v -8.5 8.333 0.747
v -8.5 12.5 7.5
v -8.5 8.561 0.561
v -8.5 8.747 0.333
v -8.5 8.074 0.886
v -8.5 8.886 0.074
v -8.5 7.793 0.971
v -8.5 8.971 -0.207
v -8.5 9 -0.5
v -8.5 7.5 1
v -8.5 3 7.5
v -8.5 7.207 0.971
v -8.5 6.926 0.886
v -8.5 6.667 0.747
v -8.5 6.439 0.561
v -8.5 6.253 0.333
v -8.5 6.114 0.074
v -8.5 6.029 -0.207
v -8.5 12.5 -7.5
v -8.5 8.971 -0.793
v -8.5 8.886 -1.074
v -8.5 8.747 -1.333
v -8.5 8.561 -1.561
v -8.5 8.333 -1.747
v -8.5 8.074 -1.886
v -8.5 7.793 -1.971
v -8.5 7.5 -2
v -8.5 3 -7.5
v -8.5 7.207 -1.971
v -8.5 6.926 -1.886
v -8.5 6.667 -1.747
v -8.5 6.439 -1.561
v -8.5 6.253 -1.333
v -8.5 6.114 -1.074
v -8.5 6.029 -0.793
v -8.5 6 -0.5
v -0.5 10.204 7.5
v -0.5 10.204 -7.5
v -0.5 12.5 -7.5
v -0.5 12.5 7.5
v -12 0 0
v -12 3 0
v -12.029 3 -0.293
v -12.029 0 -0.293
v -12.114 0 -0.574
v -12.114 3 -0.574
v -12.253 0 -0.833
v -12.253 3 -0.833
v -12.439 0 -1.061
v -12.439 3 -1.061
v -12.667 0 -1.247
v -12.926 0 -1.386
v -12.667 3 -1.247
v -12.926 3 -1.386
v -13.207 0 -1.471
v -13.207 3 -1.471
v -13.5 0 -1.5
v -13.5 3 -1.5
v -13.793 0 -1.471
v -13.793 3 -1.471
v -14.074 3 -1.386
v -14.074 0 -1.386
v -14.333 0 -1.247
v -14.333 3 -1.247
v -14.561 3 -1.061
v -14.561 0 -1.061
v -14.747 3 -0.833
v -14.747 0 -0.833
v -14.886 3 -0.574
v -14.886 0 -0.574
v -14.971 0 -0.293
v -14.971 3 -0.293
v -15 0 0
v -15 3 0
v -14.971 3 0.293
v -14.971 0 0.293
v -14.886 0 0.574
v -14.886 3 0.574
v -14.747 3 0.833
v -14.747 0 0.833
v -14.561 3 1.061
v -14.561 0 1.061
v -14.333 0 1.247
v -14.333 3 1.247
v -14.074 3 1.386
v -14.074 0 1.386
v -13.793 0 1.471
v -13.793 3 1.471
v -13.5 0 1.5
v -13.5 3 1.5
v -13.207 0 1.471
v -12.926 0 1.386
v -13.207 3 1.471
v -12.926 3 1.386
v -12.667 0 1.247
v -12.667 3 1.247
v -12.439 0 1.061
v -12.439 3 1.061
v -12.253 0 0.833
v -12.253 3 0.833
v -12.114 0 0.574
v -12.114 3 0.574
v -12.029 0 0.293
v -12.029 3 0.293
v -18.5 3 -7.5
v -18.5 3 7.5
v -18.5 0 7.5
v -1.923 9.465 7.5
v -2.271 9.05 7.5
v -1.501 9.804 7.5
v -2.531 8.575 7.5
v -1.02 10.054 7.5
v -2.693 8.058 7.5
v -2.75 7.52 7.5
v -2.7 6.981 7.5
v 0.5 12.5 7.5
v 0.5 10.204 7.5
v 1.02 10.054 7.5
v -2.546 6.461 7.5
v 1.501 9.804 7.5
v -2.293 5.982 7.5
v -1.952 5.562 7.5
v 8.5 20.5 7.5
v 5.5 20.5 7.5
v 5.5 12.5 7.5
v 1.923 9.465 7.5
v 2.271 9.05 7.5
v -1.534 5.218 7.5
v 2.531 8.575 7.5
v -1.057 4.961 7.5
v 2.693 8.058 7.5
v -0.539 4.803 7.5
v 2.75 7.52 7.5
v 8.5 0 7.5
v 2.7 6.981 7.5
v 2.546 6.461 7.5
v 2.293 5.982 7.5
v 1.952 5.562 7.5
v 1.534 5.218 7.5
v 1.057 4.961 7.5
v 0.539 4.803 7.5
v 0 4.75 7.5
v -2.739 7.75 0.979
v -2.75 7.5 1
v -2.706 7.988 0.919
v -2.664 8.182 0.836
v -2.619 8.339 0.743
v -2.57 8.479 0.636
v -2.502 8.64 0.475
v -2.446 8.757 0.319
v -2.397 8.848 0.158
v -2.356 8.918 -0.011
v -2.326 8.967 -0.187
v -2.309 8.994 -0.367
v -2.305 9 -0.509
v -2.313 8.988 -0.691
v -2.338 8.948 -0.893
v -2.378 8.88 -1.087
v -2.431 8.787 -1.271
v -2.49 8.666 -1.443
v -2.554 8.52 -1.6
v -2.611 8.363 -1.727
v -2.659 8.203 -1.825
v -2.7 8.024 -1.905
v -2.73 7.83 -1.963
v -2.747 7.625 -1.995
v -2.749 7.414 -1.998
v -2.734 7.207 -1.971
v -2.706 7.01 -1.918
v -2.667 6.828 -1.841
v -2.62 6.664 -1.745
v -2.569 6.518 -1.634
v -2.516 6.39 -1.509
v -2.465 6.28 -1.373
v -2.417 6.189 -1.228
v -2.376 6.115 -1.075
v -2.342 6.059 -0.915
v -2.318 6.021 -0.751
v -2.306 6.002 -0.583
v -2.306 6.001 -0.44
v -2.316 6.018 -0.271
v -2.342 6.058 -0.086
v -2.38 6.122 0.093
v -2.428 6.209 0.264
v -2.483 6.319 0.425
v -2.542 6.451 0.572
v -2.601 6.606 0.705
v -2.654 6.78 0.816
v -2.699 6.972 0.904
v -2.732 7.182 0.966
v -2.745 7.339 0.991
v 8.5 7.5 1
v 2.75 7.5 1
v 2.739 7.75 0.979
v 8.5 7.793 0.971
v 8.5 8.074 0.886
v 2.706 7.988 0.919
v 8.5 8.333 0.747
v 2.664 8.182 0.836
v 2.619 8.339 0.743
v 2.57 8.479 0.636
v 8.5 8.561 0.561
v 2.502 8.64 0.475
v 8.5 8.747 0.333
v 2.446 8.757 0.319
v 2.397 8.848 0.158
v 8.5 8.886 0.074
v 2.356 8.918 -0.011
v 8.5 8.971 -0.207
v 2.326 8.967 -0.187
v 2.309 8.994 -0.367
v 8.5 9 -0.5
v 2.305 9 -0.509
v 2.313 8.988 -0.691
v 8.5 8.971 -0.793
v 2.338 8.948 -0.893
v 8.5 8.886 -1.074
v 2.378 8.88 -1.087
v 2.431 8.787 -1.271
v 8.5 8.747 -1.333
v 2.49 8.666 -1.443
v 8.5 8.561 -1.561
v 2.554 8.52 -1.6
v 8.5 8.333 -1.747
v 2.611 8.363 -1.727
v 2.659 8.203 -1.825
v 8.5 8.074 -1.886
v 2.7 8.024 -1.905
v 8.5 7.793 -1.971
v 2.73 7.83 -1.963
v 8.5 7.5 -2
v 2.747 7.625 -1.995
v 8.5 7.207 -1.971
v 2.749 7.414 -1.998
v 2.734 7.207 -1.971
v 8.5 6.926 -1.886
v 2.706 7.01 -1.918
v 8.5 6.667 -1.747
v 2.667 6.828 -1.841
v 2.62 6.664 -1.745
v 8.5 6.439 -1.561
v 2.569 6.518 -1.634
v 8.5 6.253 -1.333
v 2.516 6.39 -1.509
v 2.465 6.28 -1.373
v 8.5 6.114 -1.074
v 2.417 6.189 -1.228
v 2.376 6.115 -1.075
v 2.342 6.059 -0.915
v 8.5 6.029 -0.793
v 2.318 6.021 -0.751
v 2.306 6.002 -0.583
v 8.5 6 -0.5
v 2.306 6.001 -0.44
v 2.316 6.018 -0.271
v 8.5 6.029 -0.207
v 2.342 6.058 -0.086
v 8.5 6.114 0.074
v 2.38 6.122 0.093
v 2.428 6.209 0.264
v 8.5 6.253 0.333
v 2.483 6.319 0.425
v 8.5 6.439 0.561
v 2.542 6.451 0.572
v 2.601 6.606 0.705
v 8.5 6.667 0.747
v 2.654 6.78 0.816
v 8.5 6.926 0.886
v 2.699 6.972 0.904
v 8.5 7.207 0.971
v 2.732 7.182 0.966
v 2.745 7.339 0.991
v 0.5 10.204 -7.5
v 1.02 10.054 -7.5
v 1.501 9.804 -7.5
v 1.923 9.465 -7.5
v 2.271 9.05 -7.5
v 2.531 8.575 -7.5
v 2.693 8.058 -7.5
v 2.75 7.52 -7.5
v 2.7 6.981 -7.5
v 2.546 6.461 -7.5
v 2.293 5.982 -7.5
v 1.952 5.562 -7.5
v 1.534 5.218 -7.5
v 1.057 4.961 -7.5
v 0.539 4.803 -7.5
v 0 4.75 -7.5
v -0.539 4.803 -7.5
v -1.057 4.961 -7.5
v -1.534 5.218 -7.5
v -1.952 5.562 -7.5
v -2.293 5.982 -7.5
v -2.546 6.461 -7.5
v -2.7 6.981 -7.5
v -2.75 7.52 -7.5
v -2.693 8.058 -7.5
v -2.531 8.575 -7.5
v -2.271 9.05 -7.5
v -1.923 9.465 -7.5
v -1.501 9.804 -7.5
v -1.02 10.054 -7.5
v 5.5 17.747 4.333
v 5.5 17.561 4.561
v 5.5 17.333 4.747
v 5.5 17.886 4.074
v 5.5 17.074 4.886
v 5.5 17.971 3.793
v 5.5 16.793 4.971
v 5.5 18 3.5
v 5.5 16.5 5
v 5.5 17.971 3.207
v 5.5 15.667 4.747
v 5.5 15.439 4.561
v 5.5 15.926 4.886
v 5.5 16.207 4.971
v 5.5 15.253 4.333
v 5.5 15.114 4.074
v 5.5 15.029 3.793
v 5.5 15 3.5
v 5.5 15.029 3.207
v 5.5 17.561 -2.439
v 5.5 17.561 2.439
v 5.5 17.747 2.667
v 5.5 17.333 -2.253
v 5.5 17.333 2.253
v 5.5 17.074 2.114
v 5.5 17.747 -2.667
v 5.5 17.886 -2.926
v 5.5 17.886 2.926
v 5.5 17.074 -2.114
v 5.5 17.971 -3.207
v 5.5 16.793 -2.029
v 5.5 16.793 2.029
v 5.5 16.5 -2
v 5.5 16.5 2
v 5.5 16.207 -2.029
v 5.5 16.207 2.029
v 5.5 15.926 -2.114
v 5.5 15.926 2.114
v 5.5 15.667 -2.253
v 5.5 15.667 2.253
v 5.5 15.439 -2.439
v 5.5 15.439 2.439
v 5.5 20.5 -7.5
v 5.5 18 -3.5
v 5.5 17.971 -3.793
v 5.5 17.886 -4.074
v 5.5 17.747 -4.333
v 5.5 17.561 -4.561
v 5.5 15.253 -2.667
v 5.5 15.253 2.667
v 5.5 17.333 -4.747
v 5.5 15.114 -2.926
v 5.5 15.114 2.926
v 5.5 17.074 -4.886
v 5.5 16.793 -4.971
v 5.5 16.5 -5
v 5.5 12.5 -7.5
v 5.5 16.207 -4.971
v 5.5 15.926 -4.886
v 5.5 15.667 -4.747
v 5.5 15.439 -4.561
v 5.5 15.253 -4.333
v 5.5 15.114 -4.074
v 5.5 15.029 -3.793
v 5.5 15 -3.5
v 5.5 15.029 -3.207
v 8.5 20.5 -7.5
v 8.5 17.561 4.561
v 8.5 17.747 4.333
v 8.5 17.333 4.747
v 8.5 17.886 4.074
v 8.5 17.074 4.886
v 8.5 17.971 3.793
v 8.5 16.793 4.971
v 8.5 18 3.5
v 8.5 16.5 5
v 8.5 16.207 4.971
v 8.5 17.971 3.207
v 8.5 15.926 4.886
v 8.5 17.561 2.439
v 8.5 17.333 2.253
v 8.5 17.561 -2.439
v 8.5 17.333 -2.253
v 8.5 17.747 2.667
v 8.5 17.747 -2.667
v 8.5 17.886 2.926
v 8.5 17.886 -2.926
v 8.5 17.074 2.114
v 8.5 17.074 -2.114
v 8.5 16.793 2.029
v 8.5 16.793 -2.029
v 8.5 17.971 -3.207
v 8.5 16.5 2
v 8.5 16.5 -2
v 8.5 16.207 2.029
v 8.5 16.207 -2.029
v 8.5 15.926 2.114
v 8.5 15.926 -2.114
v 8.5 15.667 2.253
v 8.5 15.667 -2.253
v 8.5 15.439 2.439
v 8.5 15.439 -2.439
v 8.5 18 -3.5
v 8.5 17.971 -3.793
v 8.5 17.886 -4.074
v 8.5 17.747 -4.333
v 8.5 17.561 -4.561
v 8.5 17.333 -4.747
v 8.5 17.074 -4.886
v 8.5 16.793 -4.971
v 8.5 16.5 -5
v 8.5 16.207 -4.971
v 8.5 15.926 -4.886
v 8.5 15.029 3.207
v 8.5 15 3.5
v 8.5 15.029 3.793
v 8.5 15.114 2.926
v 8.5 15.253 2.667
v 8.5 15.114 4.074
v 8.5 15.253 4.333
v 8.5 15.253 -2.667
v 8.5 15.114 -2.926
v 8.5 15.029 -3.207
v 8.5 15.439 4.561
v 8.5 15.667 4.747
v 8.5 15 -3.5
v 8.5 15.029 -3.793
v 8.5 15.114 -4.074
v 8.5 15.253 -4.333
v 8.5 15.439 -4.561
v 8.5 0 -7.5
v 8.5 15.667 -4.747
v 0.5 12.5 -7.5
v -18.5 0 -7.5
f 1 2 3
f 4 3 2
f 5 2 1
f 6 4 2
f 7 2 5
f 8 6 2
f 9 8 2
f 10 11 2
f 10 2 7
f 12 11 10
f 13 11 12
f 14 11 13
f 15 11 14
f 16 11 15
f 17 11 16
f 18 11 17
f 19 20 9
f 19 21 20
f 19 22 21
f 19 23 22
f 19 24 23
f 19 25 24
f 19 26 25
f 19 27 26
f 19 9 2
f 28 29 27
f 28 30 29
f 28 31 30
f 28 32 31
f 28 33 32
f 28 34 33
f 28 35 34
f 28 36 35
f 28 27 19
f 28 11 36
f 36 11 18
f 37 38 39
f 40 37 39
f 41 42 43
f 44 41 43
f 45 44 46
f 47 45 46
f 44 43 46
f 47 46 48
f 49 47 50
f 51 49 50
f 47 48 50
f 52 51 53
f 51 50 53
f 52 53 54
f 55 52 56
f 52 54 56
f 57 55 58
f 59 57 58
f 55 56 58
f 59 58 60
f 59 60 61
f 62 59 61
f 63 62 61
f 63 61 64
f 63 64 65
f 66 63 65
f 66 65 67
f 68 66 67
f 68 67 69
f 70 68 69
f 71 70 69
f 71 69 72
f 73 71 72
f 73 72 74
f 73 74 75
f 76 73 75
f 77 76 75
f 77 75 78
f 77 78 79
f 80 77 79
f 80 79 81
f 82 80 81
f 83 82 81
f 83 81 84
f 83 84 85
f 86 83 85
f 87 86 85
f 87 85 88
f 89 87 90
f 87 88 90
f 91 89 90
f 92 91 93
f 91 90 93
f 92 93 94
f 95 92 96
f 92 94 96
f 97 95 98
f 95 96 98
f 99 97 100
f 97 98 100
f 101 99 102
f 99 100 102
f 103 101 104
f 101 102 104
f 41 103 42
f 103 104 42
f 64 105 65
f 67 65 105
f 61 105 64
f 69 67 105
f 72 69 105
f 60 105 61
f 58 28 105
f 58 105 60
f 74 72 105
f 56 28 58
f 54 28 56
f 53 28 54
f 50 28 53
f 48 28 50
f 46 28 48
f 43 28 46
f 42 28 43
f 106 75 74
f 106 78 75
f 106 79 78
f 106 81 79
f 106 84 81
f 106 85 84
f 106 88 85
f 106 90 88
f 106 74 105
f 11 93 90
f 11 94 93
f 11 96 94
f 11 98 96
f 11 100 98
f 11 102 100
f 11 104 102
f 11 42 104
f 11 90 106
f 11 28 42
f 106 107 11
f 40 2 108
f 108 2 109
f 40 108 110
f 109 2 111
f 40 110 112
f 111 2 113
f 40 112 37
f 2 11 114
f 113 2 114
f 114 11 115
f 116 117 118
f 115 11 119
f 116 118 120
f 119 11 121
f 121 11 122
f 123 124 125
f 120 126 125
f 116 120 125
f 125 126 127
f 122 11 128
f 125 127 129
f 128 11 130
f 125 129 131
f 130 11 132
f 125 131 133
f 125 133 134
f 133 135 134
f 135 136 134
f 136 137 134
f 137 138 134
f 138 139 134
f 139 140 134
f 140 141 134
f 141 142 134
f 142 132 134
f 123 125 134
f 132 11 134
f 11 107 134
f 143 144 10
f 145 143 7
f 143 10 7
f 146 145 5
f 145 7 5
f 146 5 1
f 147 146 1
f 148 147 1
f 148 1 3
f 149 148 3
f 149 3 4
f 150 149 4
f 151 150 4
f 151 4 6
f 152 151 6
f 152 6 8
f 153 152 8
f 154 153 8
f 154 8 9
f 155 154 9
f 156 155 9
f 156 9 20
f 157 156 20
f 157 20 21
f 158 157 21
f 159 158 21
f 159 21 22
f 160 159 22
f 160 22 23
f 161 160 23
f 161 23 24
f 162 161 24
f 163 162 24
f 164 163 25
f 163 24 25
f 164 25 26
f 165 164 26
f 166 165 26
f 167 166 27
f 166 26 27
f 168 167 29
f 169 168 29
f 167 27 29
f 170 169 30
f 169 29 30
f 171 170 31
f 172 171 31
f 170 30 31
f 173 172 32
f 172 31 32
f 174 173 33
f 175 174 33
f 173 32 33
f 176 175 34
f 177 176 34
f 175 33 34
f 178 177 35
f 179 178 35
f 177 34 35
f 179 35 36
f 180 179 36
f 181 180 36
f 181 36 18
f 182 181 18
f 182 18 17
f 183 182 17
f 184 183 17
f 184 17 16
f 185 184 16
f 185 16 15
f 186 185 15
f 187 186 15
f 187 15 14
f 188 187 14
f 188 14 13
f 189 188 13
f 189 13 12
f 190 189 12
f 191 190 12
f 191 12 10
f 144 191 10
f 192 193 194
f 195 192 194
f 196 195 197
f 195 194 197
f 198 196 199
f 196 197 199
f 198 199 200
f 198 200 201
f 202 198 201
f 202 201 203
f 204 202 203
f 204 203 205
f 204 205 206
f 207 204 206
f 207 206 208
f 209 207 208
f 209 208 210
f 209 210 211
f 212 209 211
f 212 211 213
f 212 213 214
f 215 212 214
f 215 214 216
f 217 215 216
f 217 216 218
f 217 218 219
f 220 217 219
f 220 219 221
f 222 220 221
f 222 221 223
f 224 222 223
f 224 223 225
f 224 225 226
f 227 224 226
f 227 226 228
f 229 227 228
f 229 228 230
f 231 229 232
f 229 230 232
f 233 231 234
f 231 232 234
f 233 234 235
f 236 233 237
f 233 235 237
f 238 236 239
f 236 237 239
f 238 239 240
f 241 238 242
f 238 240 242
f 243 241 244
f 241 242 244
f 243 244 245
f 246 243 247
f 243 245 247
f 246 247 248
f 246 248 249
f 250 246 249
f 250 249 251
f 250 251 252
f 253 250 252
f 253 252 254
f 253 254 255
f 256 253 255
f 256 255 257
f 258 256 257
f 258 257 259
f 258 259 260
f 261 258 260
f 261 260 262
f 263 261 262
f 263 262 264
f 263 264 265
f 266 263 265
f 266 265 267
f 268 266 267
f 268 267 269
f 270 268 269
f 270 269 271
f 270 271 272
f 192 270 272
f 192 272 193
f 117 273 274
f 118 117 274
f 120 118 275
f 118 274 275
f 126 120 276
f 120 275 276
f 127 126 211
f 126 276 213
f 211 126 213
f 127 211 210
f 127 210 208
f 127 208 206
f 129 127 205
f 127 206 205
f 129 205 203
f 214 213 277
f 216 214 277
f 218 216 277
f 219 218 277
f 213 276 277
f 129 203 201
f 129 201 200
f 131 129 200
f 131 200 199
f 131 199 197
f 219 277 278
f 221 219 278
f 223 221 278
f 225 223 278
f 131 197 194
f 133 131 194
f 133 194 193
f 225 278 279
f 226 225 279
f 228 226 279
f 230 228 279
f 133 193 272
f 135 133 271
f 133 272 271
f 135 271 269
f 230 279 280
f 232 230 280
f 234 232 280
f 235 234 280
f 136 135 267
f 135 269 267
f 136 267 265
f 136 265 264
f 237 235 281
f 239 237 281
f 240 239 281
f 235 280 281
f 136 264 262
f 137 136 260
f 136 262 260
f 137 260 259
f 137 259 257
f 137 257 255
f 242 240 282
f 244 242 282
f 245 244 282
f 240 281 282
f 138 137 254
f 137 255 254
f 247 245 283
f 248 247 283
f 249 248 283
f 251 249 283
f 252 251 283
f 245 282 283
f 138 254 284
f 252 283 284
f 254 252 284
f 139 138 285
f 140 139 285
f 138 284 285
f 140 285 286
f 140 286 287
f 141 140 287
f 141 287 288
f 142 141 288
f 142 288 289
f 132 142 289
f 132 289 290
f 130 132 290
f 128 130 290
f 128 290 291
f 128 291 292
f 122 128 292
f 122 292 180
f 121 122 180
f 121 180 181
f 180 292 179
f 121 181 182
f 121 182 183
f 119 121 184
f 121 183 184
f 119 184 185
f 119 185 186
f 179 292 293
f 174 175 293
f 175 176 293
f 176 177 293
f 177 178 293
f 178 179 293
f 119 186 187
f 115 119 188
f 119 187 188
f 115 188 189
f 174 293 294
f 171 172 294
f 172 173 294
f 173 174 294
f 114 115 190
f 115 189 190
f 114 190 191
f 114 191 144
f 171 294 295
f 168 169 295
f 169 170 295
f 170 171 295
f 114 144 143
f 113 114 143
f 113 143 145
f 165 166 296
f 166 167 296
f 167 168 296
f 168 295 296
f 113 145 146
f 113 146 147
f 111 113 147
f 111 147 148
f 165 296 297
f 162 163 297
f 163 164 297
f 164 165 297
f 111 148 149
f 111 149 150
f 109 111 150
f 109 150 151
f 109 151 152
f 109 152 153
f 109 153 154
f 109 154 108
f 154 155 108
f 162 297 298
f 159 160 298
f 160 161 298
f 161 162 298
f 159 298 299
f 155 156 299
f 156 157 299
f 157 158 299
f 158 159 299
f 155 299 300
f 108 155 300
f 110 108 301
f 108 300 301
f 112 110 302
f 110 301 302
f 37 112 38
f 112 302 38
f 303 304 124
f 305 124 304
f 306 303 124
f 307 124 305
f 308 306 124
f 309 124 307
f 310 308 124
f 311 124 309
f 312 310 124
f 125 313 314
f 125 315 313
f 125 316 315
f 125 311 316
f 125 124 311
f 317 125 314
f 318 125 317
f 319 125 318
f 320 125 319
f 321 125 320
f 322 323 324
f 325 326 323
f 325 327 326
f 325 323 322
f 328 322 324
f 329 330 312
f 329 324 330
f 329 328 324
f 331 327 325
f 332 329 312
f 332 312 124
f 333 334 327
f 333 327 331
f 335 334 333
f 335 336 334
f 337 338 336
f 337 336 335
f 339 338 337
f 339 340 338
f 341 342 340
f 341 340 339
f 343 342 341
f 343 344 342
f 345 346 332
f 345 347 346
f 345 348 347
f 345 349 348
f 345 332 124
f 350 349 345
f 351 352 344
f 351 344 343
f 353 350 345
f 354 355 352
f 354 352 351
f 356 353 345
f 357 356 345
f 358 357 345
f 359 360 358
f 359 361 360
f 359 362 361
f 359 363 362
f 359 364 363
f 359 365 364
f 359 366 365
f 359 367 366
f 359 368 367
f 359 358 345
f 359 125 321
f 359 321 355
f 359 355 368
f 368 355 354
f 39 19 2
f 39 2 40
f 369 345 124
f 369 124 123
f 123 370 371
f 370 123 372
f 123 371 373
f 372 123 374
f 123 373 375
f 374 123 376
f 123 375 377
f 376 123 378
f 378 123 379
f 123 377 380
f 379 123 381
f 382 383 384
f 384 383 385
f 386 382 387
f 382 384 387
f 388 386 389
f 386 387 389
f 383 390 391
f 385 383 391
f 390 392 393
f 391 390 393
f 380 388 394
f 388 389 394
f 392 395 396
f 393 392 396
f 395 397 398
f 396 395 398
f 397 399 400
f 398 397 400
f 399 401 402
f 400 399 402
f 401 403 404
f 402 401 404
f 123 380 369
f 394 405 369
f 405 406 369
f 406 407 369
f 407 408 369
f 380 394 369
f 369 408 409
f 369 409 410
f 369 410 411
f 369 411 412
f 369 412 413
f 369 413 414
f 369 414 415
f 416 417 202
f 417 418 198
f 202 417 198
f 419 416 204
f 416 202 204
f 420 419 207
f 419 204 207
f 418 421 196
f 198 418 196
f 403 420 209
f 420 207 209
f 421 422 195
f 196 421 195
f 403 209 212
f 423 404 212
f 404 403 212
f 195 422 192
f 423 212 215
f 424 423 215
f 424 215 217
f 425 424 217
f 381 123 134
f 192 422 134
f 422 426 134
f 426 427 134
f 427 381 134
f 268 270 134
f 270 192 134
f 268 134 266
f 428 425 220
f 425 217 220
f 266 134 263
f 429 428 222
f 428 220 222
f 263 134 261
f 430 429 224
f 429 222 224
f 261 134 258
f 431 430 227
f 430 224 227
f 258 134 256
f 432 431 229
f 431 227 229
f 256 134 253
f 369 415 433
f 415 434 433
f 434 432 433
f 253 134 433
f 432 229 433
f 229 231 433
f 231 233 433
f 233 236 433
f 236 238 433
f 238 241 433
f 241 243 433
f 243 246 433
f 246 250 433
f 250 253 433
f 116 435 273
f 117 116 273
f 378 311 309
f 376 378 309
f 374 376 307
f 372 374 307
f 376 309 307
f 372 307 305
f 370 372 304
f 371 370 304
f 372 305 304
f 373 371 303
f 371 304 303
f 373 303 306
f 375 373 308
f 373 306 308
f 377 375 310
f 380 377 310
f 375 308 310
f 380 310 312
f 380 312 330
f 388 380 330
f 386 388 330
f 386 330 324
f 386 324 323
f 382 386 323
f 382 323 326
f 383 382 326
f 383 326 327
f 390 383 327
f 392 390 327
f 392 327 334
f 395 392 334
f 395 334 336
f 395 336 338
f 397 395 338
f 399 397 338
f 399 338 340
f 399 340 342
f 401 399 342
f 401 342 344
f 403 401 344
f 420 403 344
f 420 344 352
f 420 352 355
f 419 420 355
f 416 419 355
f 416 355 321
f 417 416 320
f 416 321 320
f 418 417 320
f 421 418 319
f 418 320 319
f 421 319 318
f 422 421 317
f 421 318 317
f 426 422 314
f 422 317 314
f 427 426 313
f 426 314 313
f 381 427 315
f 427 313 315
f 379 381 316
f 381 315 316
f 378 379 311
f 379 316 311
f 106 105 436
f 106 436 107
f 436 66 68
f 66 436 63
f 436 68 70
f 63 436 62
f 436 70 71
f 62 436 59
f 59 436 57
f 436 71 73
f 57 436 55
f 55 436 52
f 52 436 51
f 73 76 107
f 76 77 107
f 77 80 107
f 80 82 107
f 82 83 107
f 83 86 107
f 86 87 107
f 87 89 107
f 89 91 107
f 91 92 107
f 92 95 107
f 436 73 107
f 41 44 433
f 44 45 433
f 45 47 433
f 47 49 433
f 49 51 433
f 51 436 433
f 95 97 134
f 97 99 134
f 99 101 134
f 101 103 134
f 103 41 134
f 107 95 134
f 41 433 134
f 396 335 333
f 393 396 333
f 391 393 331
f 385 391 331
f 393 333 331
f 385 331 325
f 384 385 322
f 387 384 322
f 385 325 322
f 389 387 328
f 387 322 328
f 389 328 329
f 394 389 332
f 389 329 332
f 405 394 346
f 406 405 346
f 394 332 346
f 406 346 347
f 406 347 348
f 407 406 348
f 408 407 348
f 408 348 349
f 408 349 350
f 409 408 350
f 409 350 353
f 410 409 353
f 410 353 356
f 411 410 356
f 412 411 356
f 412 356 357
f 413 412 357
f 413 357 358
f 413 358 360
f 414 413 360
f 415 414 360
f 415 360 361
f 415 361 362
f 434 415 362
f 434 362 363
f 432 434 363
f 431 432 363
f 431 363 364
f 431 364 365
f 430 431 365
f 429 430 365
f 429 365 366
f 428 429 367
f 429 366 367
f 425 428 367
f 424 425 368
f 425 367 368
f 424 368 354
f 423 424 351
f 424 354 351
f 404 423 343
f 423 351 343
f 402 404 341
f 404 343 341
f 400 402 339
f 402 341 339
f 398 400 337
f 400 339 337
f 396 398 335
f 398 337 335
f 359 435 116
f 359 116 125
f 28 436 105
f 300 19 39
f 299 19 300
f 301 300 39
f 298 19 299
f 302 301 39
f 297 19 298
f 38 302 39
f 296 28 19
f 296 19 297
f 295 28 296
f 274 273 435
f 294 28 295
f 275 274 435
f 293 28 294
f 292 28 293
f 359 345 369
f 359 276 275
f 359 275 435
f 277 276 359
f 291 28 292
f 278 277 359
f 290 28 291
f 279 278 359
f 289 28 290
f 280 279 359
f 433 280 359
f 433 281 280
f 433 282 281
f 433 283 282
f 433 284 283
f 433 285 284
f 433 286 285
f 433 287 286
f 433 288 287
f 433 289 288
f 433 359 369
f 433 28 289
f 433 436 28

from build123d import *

# Parameters (mm, degrees)
CROQUIS1_W              = 17
CROQUIS1_H              = 15
SALIENTE_EXTRUIR1_DEPTH = 12.5
CROQUIS2_R              = 2.75
CORTAR_EXTRUIR1_DEPTH   = 20
CROQUIS4_R              = 1.5
CORTAR_EXTRUIR3_DEPTH   = 20
CROQUIS8_W              = 15
CROQUIS8_H              = 3
SALIENTE_EXTRUIR2_DEPTH = 10
CROQUIS9_R              = 1.5
CORTAR_EXTRUIR6_DEPTH   = 6
CROQUIS10_W             = 3
CROQUIS10_H             = 15
SALIENTE_EXTRUIR3_DEPTH = 8
CROQUIS11_R             = 1.5
CORTAR_EXTRUIR8_DEPTH   = 6


with BuildPart() as part:
    # Croquis1 → Saliente-Extruir1 (new body)
    with BuildSketch(Plane(origin=(0, 0, 0), x_dir=(1, 0, 0), z_dir=(0, 1, 0))):
        Rectangle(CROQUIS1_W, CROQUIS1_H)
    extrude(amount=SALIENTE_EXTRUIR1_DEPTH)

    # Croquis2 → Cortar-Extruir1 (cut)
    with BuildSketch(Plane(origin=(0, 0, -7.5), x_dir=(-1, 0, 0), z_dir=(0, 0, -1))):
        with Locations((0, 7.5)):
            Circle(CROQUIS2_R)
        with BuildLine():
            Line((0.5, 12.5), (-0.5, 12.5))
            Line((-0.5, 12.5), (-0.5, 10.204163457))
            ThreePointArc((-0.5, 10.204163457), (0, 10.25), (0.5, 10.204163457))
            Line((0.5, 10.204163457), (0.5, 12.5))
        make_face()
    extrude(amount=-CORTAR_EXTRUIR1_DEPTH, mode=Mode.SUBTRACT)

    # Croquis4 → Cortar-Extruir3 (cut)
    with BuildSketch(Plane.ZY.offset(8.5)):
        with Locations((-0.5, 7.5)):
            Circle(CROQUIS4_R)
    extrude(amount=-CORTAR_EXTRUIR3_DEPTH, mode=Mode.SUBTRACT)

    # Croquis8 → Saliente-Extruir2 (add)
    with BuildSketch(Plane.ZY.offset(8.5)):
        with Locations((0, 1.5)):
            Rectangle(CROQUIS8_W, CROQUIS8_H)
    extrude(amount=SALIENTE_EXTRUIR2_DEPTH)

    # Croquis9 → Cortar-Extruir6 (cut)
    with BuildSketch(Plane(origin=(0, 3, 0), x_dir=(1, 0, 0), z_dir=(0, 1, 0))):
        with Locations((-13.5, 0)):
            Circle(CROQUIS9_R)
    extrude(amount=-CORTAR_EXTRUIR6_DEPTH, mode=Mode.SUBTRACT)

    # Croquis10 → Saliente-Extruir3 (add)
    with BuildSketch(Plane(origin=(0, 12.5, 0), x_dir=(1, 0, 0), z_dir=(0, 1, 0))):
        with Locations((7, 0)):
            Rectangle(CROQUIS10_W, CROQUIS10_H)
    extrude(amount=SALIENTE_EXTRUIR3_DEPTH)

    # Croquis11 → Cortar-Extruir8 (cut)
    with BuildSketch(Plane.ZY.offset(-5.5)):
        with Locations((3.5, 16.5)):
            Circle(CROQUIS11_R)
        with Locations((-3.5, 16.5)):
            Circle(CROQUIS11_R)
    extrude(amount=-CORTAR_EXTRUIR8_DEPTH, mode=Mode.SUBTRACT)


solid = part.part
